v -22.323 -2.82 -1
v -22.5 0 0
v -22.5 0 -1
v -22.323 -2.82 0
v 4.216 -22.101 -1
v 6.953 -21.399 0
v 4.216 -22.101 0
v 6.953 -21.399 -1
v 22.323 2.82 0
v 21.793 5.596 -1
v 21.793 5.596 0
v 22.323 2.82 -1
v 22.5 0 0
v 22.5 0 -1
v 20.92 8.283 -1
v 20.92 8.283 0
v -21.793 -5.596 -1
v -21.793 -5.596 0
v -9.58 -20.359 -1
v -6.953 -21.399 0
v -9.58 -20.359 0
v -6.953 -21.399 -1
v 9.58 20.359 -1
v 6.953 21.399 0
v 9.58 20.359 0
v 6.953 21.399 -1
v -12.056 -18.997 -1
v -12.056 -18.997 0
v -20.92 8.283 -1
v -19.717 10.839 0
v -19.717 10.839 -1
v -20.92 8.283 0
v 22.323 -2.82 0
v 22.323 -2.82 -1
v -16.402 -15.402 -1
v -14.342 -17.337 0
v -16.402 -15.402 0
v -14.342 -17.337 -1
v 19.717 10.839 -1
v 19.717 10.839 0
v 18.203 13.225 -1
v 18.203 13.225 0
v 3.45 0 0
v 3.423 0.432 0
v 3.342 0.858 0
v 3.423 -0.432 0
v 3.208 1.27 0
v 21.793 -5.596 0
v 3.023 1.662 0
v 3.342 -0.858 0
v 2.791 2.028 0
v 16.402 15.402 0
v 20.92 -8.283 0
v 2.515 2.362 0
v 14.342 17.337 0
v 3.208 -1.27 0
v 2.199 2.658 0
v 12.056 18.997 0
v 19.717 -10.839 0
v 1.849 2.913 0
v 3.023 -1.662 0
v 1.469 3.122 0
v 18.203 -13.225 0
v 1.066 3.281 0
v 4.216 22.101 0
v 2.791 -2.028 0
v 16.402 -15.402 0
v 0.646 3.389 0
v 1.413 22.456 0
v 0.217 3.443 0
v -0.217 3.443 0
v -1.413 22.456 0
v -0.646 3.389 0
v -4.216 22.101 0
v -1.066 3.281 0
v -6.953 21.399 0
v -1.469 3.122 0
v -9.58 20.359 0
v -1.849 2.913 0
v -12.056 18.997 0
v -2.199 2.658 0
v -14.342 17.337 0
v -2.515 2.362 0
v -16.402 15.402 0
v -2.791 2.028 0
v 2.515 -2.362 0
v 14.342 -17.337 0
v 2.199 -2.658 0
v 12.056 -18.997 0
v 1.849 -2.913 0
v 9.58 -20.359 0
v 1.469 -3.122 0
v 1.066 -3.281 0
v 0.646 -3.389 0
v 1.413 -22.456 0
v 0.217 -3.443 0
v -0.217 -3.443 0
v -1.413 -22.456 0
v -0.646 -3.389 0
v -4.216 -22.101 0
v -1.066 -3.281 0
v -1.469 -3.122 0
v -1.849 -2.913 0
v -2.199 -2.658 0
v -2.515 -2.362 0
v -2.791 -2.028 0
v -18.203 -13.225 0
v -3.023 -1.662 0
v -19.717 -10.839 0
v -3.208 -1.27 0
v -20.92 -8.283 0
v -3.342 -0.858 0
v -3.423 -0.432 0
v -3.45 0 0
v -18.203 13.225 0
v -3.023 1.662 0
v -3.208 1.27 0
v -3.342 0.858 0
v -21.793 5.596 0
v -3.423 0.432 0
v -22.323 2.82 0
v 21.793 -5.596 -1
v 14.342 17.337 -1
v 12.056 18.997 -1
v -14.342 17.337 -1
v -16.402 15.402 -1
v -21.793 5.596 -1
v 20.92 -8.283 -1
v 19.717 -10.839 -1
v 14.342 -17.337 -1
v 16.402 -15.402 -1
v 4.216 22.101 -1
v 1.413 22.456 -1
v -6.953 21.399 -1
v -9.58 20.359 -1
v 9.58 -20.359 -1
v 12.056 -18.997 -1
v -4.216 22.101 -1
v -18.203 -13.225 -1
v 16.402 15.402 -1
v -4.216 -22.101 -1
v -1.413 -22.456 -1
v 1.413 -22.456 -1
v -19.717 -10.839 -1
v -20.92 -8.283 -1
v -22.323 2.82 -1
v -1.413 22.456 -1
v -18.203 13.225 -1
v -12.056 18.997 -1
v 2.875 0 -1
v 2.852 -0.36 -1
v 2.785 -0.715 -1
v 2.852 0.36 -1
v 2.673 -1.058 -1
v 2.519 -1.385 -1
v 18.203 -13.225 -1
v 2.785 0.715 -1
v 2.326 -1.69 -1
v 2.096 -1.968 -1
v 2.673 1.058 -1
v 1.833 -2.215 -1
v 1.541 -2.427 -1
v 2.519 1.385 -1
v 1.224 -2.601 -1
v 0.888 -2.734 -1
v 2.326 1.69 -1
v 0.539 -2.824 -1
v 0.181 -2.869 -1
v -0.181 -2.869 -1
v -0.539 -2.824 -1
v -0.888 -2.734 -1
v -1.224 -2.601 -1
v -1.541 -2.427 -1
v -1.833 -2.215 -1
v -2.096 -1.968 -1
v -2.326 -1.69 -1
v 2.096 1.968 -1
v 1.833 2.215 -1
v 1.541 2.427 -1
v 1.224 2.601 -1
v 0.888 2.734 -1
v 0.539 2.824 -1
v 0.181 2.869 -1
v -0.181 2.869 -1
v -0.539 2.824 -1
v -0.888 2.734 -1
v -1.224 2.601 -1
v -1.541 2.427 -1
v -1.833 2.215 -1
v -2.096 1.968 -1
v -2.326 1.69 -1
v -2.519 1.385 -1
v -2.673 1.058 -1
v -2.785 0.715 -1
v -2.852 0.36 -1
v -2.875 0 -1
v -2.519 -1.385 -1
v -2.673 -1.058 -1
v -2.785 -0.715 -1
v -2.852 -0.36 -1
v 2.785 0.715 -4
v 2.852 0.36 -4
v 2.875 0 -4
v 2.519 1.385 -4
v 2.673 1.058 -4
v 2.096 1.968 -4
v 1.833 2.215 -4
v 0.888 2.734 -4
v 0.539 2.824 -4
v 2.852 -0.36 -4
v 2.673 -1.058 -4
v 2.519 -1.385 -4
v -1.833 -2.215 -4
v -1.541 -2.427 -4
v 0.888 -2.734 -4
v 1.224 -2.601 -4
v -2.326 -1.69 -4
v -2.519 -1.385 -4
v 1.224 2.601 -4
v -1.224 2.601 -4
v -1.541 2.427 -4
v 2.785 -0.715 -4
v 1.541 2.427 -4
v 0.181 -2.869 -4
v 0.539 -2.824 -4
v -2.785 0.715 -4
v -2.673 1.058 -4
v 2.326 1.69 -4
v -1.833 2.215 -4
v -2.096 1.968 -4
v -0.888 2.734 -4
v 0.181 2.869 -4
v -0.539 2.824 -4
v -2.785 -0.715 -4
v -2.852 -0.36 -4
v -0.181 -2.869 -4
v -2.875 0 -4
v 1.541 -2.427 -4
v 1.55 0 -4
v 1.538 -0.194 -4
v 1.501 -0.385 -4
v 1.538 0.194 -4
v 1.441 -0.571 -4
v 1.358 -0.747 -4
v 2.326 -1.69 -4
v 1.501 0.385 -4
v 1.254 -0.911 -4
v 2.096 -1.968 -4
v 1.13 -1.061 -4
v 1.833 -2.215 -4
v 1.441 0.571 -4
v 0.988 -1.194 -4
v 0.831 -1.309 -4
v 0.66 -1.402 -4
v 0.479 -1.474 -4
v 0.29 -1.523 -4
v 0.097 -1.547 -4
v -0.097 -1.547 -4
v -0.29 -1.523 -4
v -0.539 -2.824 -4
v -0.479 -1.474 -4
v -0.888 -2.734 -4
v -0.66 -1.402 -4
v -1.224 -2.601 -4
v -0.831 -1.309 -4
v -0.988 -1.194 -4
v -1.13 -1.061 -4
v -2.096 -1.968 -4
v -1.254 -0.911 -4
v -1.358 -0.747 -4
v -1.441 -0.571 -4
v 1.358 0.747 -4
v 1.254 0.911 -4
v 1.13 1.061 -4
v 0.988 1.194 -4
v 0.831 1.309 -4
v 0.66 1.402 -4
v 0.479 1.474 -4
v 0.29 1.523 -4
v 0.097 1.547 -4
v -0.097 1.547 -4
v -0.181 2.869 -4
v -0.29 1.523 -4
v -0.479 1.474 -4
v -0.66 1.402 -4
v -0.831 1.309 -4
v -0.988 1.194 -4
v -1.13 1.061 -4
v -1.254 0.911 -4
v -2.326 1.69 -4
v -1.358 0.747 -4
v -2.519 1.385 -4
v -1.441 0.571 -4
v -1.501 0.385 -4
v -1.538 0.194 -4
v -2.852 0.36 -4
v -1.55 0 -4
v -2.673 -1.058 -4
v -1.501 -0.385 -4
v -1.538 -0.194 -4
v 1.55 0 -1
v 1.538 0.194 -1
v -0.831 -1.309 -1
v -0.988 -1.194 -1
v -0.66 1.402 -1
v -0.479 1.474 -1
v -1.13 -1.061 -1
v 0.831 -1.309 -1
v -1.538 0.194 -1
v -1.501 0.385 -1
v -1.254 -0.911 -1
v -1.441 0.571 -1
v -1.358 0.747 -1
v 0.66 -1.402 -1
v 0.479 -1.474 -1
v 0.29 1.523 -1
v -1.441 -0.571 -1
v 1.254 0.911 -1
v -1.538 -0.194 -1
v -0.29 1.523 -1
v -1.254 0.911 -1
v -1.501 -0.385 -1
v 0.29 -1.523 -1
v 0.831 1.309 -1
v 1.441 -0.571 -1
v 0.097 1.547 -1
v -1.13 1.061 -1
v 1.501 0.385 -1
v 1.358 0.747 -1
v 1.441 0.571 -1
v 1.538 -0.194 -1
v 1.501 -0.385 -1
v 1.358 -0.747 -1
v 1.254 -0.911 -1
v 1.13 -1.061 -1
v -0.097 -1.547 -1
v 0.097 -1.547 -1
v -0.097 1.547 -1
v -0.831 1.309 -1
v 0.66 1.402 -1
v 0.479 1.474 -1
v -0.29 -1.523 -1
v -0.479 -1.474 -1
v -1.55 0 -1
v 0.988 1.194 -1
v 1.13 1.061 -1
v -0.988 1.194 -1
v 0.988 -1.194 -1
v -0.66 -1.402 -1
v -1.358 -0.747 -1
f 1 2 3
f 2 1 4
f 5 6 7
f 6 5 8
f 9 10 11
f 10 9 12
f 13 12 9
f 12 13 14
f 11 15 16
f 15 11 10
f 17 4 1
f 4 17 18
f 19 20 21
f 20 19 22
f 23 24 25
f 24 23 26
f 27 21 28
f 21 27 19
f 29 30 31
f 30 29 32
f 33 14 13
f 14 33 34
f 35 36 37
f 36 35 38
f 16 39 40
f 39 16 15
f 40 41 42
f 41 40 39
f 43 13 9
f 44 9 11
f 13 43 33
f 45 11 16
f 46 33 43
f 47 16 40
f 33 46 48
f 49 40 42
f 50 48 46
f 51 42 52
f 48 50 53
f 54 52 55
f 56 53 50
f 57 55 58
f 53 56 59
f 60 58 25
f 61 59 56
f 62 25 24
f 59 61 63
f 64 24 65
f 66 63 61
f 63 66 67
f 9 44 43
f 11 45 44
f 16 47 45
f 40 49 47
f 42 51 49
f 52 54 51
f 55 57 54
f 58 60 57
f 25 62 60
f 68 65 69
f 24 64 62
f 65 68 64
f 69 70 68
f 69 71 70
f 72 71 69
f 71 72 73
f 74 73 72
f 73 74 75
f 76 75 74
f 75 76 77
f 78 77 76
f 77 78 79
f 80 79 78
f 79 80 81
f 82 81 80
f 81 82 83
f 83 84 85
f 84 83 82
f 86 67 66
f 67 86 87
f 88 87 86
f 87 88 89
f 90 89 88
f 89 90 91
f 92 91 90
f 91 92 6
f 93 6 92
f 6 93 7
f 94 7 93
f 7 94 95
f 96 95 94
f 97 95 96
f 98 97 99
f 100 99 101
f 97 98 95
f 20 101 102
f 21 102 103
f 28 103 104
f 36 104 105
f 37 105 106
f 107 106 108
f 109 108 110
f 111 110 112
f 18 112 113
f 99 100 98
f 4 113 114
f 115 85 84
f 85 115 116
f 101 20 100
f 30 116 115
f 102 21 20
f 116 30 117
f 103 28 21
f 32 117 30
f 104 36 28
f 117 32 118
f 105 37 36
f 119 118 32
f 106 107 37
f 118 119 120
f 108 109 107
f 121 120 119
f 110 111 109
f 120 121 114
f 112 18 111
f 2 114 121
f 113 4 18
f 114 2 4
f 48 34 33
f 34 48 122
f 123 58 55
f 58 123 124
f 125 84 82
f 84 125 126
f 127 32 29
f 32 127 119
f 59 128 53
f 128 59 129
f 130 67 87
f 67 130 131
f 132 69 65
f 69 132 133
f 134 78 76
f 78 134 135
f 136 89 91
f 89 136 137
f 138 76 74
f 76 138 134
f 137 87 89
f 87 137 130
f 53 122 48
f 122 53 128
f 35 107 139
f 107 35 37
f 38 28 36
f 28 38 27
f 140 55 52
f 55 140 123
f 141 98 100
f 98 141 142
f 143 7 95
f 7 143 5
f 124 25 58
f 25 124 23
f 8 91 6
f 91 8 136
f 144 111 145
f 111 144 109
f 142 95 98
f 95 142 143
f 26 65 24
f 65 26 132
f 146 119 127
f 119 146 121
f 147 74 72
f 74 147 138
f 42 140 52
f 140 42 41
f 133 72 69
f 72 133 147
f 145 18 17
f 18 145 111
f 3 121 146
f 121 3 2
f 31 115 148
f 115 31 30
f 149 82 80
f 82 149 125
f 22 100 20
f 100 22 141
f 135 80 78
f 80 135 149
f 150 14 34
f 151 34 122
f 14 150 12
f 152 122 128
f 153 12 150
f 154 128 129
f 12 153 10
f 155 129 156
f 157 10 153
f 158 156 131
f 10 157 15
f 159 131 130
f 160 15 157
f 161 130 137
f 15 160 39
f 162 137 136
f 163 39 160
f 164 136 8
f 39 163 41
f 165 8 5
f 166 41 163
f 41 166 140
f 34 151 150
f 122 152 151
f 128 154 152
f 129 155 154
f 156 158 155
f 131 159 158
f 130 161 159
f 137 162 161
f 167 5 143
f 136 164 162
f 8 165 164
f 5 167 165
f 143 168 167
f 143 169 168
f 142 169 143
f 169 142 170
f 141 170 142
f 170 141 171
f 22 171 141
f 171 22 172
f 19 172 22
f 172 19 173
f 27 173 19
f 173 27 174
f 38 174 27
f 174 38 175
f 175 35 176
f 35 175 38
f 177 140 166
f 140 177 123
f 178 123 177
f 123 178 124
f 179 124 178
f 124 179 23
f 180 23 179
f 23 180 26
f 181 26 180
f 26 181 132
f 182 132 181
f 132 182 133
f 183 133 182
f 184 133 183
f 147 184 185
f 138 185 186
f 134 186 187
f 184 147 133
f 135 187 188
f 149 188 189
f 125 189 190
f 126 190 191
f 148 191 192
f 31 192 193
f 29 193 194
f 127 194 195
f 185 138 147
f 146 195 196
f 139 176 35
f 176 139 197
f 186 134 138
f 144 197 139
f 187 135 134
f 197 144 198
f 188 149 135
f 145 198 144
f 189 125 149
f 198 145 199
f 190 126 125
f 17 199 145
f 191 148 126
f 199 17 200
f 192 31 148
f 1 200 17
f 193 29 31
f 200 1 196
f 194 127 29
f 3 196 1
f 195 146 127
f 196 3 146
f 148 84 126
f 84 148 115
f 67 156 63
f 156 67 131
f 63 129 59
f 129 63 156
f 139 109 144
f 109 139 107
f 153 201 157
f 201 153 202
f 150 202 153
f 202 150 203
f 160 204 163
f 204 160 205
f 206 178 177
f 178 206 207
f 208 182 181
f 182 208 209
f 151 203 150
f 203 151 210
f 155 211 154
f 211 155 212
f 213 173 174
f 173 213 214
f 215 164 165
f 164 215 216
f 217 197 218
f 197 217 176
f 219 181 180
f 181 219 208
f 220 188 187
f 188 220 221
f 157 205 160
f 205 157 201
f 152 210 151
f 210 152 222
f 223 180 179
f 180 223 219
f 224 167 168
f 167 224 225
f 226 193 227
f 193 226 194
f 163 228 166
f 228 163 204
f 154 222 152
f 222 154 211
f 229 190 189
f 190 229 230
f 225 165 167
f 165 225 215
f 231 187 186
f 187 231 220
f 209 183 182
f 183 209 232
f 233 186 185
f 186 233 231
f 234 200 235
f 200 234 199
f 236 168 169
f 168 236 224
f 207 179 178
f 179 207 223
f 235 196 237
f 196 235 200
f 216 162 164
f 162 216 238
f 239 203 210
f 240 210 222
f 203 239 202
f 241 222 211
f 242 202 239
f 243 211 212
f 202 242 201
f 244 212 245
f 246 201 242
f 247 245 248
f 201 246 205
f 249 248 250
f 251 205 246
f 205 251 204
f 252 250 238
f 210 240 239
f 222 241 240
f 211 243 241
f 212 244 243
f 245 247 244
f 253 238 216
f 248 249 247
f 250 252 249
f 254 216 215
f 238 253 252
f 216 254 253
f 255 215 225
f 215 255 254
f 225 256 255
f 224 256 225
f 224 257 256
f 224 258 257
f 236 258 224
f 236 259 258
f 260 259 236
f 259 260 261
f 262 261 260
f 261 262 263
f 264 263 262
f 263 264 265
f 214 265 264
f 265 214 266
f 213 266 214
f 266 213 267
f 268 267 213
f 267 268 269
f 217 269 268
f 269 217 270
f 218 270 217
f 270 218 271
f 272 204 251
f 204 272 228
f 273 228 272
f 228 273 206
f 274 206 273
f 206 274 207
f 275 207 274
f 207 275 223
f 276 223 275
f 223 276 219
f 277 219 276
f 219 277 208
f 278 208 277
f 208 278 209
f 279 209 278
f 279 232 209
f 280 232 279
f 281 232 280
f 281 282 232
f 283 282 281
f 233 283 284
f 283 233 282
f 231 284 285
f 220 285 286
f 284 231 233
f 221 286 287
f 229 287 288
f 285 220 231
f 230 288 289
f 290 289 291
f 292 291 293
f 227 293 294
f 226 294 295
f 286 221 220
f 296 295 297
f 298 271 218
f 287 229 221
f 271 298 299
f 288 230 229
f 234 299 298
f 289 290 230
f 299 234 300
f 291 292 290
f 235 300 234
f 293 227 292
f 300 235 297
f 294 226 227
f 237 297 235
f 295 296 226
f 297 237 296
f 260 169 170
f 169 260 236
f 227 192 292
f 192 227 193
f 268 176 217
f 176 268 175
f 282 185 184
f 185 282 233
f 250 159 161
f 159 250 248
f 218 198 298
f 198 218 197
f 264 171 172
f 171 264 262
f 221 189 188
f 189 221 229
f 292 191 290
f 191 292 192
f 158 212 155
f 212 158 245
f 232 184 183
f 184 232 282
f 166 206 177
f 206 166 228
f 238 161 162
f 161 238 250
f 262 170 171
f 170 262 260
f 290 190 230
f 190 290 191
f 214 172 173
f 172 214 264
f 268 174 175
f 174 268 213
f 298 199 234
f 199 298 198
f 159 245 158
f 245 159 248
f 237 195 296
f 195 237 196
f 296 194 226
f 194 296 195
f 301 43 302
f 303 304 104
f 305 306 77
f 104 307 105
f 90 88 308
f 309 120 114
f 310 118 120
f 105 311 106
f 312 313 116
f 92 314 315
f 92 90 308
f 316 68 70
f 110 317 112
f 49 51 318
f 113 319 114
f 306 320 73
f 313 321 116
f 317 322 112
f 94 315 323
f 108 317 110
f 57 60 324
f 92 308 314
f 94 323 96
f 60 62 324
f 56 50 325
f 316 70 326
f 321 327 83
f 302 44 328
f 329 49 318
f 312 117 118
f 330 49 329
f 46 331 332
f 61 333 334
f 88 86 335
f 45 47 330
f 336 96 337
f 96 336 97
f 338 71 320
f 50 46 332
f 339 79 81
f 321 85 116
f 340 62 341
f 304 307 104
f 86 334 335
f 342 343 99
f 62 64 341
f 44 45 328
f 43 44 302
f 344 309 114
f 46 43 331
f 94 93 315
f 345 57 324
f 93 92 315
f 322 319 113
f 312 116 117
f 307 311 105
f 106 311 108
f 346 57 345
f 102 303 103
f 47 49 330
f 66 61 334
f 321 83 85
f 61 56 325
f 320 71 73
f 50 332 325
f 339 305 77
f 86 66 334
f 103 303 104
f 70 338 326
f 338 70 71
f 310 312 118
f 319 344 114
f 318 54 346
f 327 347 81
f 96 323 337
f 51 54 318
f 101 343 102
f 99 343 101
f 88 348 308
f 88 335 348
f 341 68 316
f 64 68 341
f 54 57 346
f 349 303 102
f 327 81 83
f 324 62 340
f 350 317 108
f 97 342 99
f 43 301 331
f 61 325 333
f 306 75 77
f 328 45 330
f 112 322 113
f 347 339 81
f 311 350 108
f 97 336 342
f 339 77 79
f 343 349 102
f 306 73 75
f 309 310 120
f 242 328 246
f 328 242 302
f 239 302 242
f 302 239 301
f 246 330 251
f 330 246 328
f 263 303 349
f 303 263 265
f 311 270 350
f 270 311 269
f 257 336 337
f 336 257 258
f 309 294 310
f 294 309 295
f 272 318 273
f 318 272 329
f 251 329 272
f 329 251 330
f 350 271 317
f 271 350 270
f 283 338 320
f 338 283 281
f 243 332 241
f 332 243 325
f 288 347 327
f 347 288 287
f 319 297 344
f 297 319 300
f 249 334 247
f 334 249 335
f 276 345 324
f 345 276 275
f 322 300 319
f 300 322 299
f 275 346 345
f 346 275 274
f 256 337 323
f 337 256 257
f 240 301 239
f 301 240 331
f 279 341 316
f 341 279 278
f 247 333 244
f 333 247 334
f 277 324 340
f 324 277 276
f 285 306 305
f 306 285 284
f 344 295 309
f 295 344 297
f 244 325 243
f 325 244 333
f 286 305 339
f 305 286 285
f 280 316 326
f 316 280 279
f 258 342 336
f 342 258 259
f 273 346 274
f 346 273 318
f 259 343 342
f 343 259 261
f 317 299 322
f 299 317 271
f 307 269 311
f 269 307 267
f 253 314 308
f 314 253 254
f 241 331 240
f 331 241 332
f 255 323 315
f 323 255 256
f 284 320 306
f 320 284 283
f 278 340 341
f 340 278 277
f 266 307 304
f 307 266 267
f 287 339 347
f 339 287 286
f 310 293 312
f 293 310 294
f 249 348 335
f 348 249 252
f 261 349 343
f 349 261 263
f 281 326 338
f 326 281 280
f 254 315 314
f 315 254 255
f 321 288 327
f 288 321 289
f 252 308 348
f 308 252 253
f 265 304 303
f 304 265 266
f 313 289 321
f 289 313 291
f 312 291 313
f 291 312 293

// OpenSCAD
$fn = 50;


difference() {
	union() {
		translate(v = [0, 0, -1.0000000000]) {
			cylinder(h = 1.0000000000, r = 22.5000000000);
		}
		#translate(v = [0, 0, -4.0000000000]) {
			cylinder(h = 4.0000000000, r = 2.8750000000);
		}
	}
	union() {
		translate(v = [0, 0, 0]) {
			rotate(a = [0, 0, 0]) {
				difference() {
					union() {
						translate(v = [0, 0, -4.0000000000]) {
							cylinder(h = 4.0000000000, r = 1.2500000000);
						}
						translate(v = [0, 0, -1.0000000000]) {
							cylinder(h = 1.0000000000, r1 = 1.5500000000, r2 = 3.4500000000);
						}
						translate(v = [0, 0, -4.0000000000]) {
							cylinder(h = 4.0000000000, r = 1.5500000000);
						}
						translate(v = [0, 0, -4.0000000000]) {
							cylinder(h = 4.0000000000, r = 1.2500000000);
						}
					}
					union();
				}
			}
		}
	}
}
